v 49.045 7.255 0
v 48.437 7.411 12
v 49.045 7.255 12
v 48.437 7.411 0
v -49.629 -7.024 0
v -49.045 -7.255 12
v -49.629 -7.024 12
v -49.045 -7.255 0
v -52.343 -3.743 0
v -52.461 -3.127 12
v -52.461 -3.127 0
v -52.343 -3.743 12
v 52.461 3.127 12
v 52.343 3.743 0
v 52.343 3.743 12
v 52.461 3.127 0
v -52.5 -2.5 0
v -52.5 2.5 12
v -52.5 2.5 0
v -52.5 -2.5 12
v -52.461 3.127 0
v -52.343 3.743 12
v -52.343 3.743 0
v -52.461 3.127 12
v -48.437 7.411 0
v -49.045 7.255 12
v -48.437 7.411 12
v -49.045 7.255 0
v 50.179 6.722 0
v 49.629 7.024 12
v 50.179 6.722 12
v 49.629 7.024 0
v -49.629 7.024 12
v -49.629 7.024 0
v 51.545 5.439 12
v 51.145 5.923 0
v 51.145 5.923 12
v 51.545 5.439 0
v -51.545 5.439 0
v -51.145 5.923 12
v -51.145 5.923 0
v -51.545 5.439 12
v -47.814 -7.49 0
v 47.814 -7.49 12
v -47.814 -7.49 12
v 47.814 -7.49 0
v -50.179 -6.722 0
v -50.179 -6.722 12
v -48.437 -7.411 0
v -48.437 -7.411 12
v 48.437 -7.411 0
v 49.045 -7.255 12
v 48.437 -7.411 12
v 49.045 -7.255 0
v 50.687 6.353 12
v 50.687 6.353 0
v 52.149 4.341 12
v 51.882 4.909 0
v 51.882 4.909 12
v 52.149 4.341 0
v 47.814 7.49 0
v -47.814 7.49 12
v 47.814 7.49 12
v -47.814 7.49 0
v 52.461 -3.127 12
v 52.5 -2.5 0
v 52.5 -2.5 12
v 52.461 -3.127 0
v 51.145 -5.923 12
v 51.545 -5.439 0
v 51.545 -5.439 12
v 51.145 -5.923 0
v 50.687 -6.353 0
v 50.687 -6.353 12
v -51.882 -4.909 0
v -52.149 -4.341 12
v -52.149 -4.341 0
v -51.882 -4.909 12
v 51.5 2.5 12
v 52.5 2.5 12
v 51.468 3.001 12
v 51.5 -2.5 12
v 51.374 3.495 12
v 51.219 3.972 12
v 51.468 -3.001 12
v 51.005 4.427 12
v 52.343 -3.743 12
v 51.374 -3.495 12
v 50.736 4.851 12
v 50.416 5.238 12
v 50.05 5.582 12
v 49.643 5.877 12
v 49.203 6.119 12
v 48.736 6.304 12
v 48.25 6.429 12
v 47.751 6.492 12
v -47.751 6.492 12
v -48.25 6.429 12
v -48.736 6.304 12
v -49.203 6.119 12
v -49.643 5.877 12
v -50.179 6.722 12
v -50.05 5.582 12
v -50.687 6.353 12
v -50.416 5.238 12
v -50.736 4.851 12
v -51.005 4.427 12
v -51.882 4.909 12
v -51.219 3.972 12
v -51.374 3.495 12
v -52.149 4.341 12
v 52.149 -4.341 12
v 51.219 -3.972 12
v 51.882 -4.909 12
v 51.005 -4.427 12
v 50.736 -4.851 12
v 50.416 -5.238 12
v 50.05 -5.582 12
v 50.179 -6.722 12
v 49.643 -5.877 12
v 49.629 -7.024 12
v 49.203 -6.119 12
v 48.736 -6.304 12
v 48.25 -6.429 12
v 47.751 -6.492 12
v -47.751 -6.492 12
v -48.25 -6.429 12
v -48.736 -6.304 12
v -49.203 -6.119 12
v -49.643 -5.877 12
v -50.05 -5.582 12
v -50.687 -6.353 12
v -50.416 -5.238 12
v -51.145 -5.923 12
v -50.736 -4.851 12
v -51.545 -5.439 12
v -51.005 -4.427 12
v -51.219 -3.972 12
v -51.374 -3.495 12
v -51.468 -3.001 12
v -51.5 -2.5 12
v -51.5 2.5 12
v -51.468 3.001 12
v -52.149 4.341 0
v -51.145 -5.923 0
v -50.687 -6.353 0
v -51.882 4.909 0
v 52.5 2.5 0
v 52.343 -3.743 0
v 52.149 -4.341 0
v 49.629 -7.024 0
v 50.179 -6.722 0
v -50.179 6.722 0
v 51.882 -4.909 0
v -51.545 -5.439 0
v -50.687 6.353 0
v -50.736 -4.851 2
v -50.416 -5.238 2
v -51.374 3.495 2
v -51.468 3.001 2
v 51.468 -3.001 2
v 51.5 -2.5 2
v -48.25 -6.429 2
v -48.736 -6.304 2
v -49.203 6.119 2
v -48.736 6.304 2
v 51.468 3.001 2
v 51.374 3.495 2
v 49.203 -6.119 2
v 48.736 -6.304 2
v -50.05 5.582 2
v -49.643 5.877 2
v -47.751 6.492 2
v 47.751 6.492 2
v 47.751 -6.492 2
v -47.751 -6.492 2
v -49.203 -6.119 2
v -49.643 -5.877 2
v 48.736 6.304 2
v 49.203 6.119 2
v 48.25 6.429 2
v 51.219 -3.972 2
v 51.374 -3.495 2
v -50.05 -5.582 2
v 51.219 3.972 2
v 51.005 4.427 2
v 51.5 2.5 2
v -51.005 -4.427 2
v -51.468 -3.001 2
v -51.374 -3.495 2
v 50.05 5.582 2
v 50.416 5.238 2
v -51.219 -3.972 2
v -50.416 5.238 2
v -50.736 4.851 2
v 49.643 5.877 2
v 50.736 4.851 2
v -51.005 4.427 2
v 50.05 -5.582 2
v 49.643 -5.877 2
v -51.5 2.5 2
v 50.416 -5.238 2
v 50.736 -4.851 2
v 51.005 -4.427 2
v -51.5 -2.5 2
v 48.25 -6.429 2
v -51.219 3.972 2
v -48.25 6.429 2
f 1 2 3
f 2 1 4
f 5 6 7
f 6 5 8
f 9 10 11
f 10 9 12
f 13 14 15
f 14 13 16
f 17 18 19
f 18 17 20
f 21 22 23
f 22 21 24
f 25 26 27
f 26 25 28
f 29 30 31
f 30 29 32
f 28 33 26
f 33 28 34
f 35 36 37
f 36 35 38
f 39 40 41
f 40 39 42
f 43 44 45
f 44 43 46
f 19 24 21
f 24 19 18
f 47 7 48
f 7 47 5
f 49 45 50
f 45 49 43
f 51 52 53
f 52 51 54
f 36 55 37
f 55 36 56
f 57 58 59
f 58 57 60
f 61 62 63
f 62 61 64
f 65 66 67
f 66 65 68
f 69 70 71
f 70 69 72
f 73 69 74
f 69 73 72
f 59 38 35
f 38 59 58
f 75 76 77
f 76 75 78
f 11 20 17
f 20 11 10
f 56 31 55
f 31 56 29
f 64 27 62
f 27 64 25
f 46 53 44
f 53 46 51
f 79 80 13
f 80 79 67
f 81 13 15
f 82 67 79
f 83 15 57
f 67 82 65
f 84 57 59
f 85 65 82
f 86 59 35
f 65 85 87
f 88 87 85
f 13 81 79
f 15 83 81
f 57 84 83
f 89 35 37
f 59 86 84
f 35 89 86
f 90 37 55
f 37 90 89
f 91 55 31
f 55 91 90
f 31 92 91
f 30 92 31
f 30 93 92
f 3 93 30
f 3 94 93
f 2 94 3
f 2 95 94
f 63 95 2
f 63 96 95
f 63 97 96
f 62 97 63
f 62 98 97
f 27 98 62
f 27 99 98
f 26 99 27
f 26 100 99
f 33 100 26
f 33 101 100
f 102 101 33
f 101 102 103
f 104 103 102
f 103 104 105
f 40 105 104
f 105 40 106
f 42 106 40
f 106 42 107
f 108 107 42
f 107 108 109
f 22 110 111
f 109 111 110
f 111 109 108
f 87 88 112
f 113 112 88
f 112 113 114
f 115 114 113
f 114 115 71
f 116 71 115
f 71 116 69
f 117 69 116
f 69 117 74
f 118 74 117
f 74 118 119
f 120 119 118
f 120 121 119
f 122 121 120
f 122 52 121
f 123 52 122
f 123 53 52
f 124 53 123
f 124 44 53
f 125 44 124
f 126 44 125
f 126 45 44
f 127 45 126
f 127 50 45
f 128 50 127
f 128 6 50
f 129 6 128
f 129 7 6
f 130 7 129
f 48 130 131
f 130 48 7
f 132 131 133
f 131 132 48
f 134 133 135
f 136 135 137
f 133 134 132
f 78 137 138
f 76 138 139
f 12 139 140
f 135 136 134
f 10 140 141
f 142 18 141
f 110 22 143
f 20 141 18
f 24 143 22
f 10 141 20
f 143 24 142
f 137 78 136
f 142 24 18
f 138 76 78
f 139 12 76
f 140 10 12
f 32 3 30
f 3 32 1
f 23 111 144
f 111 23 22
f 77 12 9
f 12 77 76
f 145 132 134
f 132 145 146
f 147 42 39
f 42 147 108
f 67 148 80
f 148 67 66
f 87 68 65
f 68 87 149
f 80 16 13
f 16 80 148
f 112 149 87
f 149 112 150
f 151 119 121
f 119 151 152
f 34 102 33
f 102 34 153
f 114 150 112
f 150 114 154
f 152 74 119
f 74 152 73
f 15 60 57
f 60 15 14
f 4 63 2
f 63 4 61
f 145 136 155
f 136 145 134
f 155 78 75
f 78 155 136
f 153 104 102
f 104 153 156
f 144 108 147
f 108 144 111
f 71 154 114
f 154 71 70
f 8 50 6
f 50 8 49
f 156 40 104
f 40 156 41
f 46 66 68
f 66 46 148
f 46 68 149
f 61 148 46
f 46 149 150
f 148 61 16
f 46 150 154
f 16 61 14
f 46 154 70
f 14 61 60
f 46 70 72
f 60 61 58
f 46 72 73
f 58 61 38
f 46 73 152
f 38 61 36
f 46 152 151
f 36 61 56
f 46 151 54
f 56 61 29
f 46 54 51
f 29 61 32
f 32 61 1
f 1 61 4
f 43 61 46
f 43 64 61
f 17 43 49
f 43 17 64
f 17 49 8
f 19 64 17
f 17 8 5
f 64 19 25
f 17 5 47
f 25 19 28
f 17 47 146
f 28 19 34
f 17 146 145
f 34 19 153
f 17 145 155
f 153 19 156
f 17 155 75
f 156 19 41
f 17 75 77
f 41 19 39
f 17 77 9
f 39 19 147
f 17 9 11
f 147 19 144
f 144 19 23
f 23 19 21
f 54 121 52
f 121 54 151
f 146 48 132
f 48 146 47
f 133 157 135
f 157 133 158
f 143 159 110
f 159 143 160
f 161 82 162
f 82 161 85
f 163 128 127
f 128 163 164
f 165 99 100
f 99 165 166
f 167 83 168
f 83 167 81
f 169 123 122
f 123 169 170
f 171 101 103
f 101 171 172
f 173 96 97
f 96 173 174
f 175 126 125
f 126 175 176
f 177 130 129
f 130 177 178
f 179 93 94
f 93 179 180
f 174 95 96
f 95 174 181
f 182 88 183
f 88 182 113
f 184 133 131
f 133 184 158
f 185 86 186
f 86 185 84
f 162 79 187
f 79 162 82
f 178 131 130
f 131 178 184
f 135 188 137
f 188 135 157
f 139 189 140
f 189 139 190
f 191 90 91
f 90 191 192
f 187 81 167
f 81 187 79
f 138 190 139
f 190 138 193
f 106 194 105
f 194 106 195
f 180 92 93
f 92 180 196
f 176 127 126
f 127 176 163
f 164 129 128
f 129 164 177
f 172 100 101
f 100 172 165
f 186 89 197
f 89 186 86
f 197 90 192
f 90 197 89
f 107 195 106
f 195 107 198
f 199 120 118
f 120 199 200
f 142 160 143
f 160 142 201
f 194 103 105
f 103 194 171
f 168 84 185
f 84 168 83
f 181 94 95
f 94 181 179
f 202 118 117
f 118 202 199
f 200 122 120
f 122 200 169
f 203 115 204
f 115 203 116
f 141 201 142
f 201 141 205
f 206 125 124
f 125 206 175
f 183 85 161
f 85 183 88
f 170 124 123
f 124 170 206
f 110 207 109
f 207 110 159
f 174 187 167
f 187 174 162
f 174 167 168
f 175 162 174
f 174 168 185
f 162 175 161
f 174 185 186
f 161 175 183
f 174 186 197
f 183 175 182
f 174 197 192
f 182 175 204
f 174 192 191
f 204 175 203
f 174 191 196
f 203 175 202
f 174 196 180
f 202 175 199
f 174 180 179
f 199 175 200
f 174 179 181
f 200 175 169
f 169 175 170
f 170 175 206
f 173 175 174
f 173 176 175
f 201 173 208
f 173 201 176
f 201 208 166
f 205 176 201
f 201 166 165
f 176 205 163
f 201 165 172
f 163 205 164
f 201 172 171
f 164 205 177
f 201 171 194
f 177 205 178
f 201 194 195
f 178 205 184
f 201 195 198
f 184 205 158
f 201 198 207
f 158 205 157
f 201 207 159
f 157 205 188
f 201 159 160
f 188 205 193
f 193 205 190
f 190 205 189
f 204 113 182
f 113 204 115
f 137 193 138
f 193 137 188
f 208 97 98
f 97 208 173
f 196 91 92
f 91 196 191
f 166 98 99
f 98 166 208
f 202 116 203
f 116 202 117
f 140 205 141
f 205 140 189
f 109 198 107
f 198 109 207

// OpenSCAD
$fn = 50;


difference() {
	union() {
		hull() {
			translate(v = [-47.5000000000, 2.5000000000, 0]) {
				cylinder(h = 12, r = 5);
			}
			translate(v = [47.5000000000, 2.5000000000, 0]) {
				cylinder(h = 12, r = 5);
			}
			translate(v = [-47.5000000000, -2.5000000000, 0]) {
				cylinder(h = 12, r = 5);
			}
			translate(v = [47.5000000000, -2.5000000000, 0]) {
				cylinder(h = 12, r = 5);
			}
		}
	}
	union() {
		translate(v = [0, 0, 2]) {
			hull() {
				translate(v = [-47.5000000000, 2.5000000000, 0]) {
					cylinder(h = 10, r = 4);
				}
				translate(v = [47.5000000000, 2.5000000000, 0]) {
					cylinder(h = 10, r = 4);
				}
				translate(v = [-47.5000000000, -2.5000000000, 0]) {
					cylinder(h = 10, r = 4);
				}
				translate(v = [47.5000000000, -2.5000000000, 0]) {
					cylinder(h = 10, r = 4);
				}
			}
		}
	}
}
